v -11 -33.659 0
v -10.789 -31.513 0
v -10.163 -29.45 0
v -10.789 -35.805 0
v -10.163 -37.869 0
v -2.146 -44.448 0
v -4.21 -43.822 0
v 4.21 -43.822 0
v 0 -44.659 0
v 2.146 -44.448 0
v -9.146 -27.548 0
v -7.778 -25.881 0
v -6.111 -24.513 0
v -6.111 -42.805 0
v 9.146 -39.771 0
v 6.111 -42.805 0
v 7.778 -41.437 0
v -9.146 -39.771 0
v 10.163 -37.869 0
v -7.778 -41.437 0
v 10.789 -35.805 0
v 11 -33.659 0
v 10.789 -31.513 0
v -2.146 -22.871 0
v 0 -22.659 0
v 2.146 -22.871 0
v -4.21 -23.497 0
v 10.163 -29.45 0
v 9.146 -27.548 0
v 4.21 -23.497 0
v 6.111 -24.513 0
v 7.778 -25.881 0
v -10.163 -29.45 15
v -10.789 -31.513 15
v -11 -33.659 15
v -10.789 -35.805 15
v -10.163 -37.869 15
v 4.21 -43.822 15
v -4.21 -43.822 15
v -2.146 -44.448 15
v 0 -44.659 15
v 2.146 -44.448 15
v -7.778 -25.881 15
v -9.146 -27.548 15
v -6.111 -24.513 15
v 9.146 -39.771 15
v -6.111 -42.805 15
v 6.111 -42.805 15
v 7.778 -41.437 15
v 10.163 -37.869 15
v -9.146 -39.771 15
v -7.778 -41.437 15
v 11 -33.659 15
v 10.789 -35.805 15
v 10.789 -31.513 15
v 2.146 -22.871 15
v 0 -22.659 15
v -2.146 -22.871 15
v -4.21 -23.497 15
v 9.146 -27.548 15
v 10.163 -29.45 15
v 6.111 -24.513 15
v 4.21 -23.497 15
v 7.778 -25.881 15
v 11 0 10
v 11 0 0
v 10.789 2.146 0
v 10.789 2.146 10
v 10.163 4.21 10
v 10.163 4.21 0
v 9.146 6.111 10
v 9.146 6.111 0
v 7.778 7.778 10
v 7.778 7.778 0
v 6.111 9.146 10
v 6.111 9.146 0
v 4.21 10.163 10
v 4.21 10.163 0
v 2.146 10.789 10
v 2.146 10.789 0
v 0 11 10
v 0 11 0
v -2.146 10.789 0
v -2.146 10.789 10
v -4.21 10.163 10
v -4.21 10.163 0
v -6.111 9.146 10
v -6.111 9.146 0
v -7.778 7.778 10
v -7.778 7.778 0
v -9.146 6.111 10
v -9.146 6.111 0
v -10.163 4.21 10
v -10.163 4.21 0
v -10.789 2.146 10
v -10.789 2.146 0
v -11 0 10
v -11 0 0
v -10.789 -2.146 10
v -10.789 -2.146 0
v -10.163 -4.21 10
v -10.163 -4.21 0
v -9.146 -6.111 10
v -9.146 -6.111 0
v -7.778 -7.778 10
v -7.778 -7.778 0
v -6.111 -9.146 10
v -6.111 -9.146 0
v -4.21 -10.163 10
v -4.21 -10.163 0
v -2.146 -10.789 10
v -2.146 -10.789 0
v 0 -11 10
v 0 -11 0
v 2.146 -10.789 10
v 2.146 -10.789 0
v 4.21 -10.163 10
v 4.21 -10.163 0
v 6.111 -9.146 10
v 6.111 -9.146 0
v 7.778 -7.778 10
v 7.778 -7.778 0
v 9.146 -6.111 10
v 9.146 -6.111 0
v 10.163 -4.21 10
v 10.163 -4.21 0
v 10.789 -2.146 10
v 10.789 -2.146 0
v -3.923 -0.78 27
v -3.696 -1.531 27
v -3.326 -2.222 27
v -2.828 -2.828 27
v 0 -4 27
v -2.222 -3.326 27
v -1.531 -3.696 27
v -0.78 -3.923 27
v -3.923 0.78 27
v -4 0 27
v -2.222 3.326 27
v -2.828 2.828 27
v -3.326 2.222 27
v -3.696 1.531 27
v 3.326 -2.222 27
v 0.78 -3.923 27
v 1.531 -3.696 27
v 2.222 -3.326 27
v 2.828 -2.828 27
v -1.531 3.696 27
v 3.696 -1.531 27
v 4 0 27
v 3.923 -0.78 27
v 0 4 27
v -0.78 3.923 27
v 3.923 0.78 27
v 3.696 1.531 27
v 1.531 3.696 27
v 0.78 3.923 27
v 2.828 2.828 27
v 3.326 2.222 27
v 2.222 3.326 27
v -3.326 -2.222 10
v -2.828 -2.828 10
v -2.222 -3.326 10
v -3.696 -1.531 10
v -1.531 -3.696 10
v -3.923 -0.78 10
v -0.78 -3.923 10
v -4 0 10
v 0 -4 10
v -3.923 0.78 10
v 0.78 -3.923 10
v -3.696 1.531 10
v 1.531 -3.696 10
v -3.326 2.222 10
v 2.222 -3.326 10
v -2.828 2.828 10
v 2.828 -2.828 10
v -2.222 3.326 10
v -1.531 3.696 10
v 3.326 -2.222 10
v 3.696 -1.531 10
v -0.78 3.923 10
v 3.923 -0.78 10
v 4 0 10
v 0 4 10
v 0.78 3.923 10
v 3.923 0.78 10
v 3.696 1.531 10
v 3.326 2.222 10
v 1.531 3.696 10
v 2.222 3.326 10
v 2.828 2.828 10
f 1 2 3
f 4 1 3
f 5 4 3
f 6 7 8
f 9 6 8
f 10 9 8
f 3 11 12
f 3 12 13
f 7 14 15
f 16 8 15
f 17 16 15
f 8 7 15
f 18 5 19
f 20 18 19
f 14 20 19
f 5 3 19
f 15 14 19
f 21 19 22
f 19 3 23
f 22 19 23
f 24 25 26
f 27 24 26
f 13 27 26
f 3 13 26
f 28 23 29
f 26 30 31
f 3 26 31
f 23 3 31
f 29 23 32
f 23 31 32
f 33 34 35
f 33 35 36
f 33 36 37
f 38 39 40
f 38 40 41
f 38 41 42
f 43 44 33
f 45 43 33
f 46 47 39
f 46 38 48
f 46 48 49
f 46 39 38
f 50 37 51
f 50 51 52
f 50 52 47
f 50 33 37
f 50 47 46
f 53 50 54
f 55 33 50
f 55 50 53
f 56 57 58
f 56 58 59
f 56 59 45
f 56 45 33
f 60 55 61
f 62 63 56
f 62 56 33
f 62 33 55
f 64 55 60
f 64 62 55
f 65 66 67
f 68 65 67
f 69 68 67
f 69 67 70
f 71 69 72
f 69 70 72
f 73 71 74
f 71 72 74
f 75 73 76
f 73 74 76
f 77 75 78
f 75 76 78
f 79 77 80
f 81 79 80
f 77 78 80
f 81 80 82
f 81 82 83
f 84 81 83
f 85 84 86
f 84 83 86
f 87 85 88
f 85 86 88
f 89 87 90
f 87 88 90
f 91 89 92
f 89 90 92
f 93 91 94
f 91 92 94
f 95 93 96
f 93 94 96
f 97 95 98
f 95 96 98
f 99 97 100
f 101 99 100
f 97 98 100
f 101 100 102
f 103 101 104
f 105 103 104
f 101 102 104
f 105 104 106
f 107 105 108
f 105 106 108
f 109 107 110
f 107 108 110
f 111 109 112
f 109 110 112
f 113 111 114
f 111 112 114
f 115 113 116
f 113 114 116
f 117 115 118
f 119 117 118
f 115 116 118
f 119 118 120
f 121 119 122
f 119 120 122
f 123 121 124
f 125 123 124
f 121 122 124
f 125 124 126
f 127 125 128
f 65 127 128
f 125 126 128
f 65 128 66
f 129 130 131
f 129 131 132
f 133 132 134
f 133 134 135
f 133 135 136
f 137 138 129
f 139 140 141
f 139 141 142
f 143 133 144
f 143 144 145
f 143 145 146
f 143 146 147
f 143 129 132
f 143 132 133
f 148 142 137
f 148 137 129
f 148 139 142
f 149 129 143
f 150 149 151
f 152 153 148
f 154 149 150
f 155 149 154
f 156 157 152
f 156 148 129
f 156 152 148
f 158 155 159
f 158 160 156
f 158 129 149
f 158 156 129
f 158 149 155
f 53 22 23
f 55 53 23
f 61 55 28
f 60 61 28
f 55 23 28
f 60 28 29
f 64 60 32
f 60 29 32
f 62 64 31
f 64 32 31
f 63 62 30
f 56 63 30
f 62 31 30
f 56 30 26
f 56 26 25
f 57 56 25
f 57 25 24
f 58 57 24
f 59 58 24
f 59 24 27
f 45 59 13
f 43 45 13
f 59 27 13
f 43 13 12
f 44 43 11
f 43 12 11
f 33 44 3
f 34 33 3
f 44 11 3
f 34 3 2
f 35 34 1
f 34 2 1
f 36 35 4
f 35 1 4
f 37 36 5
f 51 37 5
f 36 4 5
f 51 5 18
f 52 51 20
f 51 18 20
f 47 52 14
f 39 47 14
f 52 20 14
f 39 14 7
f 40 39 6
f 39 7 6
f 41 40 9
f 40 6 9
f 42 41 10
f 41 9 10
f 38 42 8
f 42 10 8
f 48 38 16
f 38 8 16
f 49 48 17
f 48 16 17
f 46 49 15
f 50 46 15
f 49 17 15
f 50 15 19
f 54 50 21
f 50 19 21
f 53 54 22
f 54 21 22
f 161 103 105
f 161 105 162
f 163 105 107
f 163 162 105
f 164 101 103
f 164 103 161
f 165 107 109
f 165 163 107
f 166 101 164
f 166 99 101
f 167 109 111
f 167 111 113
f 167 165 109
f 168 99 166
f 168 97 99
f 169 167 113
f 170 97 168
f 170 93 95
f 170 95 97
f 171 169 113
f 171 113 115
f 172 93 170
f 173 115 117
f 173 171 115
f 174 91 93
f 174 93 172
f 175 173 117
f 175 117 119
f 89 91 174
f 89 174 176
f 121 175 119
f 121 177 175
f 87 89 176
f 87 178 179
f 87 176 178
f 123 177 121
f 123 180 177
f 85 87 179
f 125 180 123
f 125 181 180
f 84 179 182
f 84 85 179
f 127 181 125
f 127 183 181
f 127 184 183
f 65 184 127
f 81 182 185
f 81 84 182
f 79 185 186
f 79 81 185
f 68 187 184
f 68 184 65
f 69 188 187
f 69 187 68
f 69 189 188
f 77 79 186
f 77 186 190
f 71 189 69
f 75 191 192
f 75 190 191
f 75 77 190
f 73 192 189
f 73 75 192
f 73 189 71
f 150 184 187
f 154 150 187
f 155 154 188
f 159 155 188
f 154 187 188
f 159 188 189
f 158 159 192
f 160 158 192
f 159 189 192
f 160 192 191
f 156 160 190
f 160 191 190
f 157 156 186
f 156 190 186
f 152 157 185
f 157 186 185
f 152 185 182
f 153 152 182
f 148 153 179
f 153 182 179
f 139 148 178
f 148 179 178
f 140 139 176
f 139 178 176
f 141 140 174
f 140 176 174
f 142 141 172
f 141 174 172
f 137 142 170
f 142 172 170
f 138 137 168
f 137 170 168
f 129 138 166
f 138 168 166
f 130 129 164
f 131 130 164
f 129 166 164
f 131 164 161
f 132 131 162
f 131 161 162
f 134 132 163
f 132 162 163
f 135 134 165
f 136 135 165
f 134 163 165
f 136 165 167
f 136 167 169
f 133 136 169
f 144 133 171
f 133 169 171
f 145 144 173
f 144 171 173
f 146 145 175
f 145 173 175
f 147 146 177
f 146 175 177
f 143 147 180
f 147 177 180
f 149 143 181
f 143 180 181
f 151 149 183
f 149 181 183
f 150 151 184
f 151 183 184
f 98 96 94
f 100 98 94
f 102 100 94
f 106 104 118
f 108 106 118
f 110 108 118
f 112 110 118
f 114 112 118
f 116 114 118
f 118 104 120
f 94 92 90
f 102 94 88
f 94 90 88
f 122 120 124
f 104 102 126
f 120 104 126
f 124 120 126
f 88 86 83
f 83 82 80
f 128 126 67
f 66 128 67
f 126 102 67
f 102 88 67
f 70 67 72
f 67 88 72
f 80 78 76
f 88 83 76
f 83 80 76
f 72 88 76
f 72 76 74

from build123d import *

# Parameters (mm, degrees)
F0_R     = 11
F1_DEPTH = 10
F2_R     = 4
F3_DEPTH = 17
F4_R     = 11
F5_DEPTH = 15


with BuildPart() as f1:
    # F0 (on Top) → F1 (new body)
    with BuildSketch(Plane.XY):
        Circle(F0_R)
    extrude(amount=F1_DEPTH)

    # F2 (on face) → F3 (join)
    with BuildSketch(Plane.XY.offset(10)):
        Circle(F2_R)
    extrude(amount=F3_DEPTH)


with BuildPart() as f5:
    # F4 (on Top) → F5 (new body)
    with BuildSketch(Plane.XY):
        with Locations((0, -33.659276)):
            Circle(F4_R)
    extrude(amount=F5_DEPTH)


solid = Compound([f1.part, f5.part])
